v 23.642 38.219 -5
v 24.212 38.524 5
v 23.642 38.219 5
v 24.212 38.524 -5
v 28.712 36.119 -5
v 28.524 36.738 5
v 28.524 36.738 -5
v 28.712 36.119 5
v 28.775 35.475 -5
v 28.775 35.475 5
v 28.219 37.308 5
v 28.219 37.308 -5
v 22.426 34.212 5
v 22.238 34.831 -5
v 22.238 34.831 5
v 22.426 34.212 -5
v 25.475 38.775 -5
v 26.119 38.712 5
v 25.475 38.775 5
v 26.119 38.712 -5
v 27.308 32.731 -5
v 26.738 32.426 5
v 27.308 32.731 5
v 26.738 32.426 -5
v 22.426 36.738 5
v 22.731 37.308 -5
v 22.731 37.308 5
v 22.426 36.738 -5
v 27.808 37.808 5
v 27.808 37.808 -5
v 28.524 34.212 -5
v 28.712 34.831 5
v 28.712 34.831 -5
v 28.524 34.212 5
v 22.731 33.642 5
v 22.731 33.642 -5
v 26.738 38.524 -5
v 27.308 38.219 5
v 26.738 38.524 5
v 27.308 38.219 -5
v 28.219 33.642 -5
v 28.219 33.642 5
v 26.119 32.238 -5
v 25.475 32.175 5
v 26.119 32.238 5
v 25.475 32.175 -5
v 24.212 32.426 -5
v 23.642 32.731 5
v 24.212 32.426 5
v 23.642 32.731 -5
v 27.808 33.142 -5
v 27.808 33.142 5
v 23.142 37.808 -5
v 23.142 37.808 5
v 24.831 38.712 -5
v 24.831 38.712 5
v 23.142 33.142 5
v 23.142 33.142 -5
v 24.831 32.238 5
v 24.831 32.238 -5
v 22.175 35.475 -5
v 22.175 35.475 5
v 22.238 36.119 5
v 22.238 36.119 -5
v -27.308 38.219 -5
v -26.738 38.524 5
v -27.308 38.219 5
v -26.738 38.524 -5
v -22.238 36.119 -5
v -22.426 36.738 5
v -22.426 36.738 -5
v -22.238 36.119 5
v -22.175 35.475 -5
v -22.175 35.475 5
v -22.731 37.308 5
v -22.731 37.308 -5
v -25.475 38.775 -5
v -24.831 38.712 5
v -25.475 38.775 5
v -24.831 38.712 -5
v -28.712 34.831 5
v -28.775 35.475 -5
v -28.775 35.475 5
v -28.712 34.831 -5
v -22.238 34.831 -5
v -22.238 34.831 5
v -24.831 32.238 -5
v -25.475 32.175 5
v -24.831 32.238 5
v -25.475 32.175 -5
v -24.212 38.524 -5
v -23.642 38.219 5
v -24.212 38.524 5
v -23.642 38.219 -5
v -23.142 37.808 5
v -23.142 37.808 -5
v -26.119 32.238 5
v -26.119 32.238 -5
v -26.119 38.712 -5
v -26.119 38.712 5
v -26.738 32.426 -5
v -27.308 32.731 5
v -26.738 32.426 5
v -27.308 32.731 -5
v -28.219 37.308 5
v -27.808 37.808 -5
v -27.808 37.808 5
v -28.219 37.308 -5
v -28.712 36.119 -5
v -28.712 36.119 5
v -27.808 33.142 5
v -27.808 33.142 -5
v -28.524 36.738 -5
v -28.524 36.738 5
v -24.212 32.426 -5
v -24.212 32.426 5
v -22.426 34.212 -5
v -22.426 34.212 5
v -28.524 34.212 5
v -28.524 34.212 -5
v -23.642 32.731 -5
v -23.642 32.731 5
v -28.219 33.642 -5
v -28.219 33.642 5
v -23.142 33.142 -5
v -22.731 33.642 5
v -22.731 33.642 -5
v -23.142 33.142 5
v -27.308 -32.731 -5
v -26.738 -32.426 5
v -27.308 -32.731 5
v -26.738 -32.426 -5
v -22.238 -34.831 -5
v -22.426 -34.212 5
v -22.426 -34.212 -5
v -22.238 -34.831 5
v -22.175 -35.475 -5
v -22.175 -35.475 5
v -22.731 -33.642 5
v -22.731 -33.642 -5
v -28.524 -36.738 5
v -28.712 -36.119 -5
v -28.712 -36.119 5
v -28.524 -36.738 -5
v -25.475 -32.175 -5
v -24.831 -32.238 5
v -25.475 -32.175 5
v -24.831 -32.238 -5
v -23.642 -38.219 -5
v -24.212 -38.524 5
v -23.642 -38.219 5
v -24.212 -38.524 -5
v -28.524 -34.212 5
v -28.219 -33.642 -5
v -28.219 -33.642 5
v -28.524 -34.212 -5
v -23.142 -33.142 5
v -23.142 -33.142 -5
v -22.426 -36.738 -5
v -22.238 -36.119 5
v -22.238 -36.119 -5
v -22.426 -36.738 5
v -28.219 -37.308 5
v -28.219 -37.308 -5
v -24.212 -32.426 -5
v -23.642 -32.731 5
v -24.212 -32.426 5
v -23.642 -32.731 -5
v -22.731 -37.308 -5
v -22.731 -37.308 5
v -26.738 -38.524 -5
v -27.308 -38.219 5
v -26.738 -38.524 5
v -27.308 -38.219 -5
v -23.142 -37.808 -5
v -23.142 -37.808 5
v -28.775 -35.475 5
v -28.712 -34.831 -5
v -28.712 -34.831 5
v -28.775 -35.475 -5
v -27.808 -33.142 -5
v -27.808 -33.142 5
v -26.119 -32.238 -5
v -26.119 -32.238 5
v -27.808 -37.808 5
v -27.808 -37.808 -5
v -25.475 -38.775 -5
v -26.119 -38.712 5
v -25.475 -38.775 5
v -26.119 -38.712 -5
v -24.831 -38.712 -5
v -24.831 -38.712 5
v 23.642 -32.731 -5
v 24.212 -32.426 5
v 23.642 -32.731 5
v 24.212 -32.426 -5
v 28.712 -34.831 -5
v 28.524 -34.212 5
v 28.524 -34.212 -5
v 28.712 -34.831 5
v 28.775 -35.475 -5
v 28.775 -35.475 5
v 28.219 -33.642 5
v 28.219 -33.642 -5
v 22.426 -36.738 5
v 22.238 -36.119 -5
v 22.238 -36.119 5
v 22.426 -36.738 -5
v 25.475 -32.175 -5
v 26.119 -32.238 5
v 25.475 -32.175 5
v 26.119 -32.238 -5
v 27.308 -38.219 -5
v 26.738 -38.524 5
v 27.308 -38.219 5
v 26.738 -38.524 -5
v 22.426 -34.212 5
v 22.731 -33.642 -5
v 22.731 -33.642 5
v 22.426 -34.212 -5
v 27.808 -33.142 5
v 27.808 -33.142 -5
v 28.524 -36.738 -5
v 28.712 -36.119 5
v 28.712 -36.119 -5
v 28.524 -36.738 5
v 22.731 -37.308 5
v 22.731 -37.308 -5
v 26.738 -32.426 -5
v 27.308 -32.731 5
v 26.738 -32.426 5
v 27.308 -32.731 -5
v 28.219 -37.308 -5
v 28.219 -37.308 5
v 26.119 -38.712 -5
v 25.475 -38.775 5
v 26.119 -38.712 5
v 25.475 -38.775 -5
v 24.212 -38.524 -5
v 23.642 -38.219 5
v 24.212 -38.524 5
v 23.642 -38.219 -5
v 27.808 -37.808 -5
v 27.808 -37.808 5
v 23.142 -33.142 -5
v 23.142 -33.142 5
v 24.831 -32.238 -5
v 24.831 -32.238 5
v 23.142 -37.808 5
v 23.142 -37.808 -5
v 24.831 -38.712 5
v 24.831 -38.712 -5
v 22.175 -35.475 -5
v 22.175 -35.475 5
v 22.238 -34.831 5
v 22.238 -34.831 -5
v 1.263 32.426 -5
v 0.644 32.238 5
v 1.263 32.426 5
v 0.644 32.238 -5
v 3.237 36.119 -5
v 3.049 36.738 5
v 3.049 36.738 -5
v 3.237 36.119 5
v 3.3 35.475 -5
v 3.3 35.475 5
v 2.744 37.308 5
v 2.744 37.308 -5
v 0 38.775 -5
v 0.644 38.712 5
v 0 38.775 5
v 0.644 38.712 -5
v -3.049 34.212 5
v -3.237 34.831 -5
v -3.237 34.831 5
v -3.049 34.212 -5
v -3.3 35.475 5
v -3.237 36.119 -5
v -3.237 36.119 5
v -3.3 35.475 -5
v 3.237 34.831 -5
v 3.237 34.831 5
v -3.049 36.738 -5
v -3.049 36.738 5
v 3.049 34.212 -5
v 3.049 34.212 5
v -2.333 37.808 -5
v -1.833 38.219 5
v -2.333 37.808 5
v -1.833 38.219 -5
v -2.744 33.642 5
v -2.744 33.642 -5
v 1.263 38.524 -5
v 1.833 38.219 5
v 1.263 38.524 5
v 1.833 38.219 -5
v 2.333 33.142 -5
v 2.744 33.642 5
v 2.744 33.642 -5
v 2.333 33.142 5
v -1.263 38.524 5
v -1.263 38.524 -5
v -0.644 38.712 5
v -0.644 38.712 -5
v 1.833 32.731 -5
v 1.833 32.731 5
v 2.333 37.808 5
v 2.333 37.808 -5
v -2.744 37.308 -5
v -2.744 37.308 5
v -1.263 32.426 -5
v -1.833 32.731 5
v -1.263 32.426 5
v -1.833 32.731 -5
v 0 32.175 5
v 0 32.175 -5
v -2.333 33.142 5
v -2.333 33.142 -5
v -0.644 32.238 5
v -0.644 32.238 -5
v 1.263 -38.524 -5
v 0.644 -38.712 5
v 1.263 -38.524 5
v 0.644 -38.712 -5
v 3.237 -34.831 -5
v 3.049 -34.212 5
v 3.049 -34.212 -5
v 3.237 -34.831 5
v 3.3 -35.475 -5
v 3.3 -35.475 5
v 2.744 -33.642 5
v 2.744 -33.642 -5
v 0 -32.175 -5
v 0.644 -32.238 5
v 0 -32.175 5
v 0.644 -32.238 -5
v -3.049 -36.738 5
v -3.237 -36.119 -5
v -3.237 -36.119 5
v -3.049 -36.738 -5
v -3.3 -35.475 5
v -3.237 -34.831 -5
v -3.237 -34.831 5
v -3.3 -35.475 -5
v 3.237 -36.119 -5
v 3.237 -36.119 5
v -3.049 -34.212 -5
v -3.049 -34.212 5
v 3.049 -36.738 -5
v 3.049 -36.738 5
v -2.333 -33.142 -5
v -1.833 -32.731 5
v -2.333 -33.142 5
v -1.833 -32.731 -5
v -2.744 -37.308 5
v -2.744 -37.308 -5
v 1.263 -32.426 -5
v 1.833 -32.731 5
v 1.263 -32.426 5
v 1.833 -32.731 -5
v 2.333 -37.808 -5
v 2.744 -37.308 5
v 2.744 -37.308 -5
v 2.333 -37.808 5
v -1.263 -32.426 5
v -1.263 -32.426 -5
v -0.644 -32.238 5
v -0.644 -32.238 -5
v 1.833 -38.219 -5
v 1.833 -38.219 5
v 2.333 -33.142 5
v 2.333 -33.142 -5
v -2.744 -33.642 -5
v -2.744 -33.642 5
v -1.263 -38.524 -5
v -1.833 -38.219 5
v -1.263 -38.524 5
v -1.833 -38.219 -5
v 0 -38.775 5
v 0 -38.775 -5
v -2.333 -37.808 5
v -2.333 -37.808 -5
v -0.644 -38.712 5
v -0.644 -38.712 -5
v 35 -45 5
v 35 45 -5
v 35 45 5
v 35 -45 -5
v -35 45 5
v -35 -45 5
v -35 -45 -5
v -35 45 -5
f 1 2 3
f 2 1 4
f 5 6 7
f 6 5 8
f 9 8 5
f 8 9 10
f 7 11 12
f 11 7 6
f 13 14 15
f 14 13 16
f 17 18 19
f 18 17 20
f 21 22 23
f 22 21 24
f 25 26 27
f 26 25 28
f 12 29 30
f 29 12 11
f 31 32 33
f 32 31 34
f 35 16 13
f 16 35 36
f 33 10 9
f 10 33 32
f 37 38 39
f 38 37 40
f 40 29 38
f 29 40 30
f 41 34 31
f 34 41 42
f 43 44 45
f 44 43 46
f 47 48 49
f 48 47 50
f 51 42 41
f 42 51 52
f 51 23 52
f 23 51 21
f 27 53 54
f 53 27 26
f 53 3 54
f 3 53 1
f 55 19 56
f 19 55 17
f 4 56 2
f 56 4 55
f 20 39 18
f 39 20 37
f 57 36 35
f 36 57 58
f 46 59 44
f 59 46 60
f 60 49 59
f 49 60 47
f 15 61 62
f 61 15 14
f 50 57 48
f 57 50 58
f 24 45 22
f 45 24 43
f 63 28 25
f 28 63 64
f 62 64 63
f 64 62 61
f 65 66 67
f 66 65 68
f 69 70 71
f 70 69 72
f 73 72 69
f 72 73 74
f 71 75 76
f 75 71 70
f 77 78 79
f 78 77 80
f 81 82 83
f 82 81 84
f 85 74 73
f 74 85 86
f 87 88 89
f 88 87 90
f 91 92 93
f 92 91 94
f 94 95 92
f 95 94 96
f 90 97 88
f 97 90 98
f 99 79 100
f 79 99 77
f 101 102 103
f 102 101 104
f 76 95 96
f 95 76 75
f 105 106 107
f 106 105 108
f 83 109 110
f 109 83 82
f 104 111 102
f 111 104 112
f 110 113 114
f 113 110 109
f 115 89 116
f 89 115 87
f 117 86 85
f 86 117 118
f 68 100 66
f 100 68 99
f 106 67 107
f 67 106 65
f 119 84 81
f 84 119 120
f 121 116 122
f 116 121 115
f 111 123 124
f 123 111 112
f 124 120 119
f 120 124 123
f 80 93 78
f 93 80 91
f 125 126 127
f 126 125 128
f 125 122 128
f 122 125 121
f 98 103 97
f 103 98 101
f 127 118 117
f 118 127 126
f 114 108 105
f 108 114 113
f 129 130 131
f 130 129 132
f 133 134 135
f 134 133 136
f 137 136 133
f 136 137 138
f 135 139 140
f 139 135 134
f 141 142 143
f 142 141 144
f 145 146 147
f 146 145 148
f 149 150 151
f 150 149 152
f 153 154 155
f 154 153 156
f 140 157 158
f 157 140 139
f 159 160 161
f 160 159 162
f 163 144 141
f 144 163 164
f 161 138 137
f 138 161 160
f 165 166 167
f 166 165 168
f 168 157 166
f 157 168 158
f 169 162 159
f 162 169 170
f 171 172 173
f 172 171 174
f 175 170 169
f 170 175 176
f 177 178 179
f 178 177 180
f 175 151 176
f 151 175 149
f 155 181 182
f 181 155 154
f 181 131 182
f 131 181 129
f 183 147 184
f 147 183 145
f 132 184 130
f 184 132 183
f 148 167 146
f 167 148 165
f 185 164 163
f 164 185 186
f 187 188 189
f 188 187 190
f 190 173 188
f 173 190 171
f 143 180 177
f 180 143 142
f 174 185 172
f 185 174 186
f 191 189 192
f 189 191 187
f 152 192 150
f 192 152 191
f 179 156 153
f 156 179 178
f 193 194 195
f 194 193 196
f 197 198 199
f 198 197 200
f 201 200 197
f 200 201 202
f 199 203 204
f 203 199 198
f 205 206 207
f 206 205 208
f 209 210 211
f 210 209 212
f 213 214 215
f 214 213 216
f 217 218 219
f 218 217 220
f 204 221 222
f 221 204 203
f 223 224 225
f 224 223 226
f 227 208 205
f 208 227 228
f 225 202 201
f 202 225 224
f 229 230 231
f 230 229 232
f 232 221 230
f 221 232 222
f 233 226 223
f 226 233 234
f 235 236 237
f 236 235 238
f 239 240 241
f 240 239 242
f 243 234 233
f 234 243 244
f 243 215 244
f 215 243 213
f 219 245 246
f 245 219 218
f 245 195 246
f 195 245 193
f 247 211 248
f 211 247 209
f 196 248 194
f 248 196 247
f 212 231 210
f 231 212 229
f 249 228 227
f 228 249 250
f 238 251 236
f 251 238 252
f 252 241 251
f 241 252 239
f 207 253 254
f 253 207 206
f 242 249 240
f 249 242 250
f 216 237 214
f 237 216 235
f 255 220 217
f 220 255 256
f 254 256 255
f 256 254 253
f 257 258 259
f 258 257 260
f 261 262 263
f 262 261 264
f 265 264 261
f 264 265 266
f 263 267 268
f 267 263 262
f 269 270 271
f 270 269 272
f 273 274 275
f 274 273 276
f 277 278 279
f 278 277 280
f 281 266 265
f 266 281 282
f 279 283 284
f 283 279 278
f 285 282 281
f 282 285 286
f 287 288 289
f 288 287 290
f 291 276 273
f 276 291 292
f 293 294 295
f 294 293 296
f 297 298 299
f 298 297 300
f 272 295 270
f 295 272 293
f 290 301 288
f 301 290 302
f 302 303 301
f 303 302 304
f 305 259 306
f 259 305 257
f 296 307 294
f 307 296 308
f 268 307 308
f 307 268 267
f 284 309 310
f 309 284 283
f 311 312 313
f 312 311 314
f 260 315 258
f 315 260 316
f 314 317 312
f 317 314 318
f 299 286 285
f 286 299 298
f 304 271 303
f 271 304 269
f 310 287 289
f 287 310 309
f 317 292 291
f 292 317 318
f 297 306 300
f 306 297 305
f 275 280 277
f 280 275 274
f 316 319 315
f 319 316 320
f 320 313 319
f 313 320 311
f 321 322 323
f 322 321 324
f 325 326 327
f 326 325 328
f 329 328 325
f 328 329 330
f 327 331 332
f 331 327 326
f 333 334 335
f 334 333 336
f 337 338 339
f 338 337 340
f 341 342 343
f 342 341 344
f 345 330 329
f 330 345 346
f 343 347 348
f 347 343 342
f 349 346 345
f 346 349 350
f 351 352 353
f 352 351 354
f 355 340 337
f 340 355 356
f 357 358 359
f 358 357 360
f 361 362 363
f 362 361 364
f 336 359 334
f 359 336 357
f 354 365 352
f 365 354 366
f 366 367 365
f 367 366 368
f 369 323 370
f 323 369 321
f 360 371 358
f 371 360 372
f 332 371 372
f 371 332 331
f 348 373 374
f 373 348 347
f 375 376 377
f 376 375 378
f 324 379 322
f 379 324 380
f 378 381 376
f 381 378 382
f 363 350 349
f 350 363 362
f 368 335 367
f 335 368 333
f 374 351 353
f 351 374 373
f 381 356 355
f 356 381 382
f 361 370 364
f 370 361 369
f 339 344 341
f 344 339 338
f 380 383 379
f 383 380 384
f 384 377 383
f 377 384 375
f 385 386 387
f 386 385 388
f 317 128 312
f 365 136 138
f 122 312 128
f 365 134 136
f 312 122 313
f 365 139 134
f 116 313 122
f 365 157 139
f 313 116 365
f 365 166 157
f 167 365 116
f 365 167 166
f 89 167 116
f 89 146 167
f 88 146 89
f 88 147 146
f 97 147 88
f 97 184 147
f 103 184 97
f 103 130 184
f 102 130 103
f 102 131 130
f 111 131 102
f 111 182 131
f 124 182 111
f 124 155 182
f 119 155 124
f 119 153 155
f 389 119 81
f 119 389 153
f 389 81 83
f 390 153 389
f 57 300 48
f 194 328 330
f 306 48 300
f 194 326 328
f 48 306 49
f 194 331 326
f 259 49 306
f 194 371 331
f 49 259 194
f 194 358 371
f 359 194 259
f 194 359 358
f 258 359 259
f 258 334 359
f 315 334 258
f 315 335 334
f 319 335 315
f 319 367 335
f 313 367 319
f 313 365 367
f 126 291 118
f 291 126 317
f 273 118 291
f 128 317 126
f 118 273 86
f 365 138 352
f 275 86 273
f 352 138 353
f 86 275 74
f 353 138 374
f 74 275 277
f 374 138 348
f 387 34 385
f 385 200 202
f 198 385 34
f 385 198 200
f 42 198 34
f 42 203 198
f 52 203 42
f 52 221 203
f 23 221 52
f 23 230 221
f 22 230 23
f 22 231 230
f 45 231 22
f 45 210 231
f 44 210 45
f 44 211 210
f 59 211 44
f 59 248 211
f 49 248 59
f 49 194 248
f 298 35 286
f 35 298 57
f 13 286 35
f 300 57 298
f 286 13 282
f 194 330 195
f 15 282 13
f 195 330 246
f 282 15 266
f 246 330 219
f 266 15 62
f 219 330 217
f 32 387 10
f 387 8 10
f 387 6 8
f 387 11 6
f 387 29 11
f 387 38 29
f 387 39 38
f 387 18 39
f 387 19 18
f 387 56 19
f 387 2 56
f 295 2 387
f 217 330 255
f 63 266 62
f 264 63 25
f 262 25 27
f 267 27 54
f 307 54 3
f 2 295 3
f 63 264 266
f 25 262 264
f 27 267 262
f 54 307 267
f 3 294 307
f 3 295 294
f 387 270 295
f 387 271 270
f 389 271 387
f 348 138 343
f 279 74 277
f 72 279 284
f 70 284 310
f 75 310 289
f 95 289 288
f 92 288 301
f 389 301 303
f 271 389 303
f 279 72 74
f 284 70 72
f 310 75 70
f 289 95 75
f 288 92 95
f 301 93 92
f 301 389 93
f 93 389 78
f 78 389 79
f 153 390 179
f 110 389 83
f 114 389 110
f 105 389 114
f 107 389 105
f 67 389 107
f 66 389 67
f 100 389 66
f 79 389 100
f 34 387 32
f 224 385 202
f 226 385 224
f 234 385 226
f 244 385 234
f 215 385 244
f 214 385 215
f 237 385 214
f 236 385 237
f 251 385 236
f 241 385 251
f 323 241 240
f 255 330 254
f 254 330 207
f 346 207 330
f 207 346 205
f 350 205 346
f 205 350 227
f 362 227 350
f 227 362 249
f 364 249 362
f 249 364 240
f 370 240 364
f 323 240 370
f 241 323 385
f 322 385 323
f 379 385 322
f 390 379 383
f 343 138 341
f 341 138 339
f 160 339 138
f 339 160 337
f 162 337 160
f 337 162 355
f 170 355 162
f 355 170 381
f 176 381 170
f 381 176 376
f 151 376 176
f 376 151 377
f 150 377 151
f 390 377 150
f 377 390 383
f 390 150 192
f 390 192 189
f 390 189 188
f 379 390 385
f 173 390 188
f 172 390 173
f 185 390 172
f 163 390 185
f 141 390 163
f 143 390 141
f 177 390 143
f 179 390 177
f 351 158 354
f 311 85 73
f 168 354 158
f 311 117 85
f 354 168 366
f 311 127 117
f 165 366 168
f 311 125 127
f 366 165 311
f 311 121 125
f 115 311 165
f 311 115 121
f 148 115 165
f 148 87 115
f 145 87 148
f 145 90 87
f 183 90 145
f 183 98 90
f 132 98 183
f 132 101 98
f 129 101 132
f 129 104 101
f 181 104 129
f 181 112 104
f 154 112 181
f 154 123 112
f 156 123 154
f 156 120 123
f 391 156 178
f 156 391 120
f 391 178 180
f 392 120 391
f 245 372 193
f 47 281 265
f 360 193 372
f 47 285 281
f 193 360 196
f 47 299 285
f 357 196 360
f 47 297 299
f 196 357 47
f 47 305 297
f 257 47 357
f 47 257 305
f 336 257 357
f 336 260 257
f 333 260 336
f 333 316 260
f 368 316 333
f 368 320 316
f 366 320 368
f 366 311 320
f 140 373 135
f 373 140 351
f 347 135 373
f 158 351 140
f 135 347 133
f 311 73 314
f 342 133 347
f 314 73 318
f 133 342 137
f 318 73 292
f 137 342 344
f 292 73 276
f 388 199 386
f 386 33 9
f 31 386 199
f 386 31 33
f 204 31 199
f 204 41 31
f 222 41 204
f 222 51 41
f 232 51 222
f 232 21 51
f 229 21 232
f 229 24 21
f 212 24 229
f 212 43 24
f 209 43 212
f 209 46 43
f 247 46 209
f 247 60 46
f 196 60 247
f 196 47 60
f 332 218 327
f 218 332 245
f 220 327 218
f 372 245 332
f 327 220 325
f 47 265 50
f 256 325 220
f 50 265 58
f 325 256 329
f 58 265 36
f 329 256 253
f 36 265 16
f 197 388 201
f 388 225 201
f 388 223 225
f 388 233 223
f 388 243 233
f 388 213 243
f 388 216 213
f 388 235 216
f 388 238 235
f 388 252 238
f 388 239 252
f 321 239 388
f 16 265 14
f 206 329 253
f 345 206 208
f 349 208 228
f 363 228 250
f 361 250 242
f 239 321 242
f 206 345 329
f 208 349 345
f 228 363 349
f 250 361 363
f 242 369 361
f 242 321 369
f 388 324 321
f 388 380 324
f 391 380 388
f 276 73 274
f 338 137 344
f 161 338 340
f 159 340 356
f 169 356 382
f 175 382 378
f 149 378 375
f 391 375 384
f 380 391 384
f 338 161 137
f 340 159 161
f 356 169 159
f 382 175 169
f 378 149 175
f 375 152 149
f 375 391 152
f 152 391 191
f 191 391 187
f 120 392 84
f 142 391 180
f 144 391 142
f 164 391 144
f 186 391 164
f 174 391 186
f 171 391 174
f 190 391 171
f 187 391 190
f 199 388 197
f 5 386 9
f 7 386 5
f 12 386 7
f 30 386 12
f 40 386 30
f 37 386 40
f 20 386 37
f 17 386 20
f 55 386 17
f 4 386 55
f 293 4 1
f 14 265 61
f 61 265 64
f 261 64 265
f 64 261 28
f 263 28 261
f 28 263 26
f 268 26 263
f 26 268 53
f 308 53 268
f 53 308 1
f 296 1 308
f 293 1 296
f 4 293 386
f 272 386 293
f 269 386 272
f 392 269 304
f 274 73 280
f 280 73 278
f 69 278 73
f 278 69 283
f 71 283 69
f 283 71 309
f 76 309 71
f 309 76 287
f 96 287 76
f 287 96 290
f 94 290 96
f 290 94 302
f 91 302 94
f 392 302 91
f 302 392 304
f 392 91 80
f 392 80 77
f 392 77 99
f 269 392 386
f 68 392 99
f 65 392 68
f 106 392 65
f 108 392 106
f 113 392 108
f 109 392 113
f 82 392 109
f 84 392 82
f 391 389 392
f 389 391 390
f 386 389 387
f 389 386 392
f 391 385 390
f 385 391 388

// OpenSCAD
$fn = 32;

// ----------------------------------------------------------------------
// Corner plate 70 x 90 x 10
// 6 holes, centres taken from the edge offset
// ----------------------------------------------------------------------

// --- parameters (mm) ---
plate = [70, 90, 10];  // overall size (x, y, z)
holes = 6;             // number of holes the drawing asks for
hole_d = 6.6;          // hole diameter
edge = 9.525;          // hole centre offset from the plate edge

// --- derived feature positions (mm) ---
corner_x = plate[0] / 2 - edge;  // = 25.48   corner hole X
corner_y = plate[1] / 2 - edge;  // = 35.48   corner hole Y
feature_centers = [
  [corner_x, corner_y],
  [-corner_x, corner_y],
  [-corner_x, -corner_y],
  [corner_x, -corner_y],
  [0, corner_y],
  [0, -corner_y]
];   // hole centres the loop below drills

// plate outline, every hole drilled through with the same cutters
difference() {
  cube(plate, center = true);
  for (centre = feature_centers)
    translate([centre[0], centre[1], 0])
      cylinder(d = hole_d, h = plate[2] + 2, center = true);
}
